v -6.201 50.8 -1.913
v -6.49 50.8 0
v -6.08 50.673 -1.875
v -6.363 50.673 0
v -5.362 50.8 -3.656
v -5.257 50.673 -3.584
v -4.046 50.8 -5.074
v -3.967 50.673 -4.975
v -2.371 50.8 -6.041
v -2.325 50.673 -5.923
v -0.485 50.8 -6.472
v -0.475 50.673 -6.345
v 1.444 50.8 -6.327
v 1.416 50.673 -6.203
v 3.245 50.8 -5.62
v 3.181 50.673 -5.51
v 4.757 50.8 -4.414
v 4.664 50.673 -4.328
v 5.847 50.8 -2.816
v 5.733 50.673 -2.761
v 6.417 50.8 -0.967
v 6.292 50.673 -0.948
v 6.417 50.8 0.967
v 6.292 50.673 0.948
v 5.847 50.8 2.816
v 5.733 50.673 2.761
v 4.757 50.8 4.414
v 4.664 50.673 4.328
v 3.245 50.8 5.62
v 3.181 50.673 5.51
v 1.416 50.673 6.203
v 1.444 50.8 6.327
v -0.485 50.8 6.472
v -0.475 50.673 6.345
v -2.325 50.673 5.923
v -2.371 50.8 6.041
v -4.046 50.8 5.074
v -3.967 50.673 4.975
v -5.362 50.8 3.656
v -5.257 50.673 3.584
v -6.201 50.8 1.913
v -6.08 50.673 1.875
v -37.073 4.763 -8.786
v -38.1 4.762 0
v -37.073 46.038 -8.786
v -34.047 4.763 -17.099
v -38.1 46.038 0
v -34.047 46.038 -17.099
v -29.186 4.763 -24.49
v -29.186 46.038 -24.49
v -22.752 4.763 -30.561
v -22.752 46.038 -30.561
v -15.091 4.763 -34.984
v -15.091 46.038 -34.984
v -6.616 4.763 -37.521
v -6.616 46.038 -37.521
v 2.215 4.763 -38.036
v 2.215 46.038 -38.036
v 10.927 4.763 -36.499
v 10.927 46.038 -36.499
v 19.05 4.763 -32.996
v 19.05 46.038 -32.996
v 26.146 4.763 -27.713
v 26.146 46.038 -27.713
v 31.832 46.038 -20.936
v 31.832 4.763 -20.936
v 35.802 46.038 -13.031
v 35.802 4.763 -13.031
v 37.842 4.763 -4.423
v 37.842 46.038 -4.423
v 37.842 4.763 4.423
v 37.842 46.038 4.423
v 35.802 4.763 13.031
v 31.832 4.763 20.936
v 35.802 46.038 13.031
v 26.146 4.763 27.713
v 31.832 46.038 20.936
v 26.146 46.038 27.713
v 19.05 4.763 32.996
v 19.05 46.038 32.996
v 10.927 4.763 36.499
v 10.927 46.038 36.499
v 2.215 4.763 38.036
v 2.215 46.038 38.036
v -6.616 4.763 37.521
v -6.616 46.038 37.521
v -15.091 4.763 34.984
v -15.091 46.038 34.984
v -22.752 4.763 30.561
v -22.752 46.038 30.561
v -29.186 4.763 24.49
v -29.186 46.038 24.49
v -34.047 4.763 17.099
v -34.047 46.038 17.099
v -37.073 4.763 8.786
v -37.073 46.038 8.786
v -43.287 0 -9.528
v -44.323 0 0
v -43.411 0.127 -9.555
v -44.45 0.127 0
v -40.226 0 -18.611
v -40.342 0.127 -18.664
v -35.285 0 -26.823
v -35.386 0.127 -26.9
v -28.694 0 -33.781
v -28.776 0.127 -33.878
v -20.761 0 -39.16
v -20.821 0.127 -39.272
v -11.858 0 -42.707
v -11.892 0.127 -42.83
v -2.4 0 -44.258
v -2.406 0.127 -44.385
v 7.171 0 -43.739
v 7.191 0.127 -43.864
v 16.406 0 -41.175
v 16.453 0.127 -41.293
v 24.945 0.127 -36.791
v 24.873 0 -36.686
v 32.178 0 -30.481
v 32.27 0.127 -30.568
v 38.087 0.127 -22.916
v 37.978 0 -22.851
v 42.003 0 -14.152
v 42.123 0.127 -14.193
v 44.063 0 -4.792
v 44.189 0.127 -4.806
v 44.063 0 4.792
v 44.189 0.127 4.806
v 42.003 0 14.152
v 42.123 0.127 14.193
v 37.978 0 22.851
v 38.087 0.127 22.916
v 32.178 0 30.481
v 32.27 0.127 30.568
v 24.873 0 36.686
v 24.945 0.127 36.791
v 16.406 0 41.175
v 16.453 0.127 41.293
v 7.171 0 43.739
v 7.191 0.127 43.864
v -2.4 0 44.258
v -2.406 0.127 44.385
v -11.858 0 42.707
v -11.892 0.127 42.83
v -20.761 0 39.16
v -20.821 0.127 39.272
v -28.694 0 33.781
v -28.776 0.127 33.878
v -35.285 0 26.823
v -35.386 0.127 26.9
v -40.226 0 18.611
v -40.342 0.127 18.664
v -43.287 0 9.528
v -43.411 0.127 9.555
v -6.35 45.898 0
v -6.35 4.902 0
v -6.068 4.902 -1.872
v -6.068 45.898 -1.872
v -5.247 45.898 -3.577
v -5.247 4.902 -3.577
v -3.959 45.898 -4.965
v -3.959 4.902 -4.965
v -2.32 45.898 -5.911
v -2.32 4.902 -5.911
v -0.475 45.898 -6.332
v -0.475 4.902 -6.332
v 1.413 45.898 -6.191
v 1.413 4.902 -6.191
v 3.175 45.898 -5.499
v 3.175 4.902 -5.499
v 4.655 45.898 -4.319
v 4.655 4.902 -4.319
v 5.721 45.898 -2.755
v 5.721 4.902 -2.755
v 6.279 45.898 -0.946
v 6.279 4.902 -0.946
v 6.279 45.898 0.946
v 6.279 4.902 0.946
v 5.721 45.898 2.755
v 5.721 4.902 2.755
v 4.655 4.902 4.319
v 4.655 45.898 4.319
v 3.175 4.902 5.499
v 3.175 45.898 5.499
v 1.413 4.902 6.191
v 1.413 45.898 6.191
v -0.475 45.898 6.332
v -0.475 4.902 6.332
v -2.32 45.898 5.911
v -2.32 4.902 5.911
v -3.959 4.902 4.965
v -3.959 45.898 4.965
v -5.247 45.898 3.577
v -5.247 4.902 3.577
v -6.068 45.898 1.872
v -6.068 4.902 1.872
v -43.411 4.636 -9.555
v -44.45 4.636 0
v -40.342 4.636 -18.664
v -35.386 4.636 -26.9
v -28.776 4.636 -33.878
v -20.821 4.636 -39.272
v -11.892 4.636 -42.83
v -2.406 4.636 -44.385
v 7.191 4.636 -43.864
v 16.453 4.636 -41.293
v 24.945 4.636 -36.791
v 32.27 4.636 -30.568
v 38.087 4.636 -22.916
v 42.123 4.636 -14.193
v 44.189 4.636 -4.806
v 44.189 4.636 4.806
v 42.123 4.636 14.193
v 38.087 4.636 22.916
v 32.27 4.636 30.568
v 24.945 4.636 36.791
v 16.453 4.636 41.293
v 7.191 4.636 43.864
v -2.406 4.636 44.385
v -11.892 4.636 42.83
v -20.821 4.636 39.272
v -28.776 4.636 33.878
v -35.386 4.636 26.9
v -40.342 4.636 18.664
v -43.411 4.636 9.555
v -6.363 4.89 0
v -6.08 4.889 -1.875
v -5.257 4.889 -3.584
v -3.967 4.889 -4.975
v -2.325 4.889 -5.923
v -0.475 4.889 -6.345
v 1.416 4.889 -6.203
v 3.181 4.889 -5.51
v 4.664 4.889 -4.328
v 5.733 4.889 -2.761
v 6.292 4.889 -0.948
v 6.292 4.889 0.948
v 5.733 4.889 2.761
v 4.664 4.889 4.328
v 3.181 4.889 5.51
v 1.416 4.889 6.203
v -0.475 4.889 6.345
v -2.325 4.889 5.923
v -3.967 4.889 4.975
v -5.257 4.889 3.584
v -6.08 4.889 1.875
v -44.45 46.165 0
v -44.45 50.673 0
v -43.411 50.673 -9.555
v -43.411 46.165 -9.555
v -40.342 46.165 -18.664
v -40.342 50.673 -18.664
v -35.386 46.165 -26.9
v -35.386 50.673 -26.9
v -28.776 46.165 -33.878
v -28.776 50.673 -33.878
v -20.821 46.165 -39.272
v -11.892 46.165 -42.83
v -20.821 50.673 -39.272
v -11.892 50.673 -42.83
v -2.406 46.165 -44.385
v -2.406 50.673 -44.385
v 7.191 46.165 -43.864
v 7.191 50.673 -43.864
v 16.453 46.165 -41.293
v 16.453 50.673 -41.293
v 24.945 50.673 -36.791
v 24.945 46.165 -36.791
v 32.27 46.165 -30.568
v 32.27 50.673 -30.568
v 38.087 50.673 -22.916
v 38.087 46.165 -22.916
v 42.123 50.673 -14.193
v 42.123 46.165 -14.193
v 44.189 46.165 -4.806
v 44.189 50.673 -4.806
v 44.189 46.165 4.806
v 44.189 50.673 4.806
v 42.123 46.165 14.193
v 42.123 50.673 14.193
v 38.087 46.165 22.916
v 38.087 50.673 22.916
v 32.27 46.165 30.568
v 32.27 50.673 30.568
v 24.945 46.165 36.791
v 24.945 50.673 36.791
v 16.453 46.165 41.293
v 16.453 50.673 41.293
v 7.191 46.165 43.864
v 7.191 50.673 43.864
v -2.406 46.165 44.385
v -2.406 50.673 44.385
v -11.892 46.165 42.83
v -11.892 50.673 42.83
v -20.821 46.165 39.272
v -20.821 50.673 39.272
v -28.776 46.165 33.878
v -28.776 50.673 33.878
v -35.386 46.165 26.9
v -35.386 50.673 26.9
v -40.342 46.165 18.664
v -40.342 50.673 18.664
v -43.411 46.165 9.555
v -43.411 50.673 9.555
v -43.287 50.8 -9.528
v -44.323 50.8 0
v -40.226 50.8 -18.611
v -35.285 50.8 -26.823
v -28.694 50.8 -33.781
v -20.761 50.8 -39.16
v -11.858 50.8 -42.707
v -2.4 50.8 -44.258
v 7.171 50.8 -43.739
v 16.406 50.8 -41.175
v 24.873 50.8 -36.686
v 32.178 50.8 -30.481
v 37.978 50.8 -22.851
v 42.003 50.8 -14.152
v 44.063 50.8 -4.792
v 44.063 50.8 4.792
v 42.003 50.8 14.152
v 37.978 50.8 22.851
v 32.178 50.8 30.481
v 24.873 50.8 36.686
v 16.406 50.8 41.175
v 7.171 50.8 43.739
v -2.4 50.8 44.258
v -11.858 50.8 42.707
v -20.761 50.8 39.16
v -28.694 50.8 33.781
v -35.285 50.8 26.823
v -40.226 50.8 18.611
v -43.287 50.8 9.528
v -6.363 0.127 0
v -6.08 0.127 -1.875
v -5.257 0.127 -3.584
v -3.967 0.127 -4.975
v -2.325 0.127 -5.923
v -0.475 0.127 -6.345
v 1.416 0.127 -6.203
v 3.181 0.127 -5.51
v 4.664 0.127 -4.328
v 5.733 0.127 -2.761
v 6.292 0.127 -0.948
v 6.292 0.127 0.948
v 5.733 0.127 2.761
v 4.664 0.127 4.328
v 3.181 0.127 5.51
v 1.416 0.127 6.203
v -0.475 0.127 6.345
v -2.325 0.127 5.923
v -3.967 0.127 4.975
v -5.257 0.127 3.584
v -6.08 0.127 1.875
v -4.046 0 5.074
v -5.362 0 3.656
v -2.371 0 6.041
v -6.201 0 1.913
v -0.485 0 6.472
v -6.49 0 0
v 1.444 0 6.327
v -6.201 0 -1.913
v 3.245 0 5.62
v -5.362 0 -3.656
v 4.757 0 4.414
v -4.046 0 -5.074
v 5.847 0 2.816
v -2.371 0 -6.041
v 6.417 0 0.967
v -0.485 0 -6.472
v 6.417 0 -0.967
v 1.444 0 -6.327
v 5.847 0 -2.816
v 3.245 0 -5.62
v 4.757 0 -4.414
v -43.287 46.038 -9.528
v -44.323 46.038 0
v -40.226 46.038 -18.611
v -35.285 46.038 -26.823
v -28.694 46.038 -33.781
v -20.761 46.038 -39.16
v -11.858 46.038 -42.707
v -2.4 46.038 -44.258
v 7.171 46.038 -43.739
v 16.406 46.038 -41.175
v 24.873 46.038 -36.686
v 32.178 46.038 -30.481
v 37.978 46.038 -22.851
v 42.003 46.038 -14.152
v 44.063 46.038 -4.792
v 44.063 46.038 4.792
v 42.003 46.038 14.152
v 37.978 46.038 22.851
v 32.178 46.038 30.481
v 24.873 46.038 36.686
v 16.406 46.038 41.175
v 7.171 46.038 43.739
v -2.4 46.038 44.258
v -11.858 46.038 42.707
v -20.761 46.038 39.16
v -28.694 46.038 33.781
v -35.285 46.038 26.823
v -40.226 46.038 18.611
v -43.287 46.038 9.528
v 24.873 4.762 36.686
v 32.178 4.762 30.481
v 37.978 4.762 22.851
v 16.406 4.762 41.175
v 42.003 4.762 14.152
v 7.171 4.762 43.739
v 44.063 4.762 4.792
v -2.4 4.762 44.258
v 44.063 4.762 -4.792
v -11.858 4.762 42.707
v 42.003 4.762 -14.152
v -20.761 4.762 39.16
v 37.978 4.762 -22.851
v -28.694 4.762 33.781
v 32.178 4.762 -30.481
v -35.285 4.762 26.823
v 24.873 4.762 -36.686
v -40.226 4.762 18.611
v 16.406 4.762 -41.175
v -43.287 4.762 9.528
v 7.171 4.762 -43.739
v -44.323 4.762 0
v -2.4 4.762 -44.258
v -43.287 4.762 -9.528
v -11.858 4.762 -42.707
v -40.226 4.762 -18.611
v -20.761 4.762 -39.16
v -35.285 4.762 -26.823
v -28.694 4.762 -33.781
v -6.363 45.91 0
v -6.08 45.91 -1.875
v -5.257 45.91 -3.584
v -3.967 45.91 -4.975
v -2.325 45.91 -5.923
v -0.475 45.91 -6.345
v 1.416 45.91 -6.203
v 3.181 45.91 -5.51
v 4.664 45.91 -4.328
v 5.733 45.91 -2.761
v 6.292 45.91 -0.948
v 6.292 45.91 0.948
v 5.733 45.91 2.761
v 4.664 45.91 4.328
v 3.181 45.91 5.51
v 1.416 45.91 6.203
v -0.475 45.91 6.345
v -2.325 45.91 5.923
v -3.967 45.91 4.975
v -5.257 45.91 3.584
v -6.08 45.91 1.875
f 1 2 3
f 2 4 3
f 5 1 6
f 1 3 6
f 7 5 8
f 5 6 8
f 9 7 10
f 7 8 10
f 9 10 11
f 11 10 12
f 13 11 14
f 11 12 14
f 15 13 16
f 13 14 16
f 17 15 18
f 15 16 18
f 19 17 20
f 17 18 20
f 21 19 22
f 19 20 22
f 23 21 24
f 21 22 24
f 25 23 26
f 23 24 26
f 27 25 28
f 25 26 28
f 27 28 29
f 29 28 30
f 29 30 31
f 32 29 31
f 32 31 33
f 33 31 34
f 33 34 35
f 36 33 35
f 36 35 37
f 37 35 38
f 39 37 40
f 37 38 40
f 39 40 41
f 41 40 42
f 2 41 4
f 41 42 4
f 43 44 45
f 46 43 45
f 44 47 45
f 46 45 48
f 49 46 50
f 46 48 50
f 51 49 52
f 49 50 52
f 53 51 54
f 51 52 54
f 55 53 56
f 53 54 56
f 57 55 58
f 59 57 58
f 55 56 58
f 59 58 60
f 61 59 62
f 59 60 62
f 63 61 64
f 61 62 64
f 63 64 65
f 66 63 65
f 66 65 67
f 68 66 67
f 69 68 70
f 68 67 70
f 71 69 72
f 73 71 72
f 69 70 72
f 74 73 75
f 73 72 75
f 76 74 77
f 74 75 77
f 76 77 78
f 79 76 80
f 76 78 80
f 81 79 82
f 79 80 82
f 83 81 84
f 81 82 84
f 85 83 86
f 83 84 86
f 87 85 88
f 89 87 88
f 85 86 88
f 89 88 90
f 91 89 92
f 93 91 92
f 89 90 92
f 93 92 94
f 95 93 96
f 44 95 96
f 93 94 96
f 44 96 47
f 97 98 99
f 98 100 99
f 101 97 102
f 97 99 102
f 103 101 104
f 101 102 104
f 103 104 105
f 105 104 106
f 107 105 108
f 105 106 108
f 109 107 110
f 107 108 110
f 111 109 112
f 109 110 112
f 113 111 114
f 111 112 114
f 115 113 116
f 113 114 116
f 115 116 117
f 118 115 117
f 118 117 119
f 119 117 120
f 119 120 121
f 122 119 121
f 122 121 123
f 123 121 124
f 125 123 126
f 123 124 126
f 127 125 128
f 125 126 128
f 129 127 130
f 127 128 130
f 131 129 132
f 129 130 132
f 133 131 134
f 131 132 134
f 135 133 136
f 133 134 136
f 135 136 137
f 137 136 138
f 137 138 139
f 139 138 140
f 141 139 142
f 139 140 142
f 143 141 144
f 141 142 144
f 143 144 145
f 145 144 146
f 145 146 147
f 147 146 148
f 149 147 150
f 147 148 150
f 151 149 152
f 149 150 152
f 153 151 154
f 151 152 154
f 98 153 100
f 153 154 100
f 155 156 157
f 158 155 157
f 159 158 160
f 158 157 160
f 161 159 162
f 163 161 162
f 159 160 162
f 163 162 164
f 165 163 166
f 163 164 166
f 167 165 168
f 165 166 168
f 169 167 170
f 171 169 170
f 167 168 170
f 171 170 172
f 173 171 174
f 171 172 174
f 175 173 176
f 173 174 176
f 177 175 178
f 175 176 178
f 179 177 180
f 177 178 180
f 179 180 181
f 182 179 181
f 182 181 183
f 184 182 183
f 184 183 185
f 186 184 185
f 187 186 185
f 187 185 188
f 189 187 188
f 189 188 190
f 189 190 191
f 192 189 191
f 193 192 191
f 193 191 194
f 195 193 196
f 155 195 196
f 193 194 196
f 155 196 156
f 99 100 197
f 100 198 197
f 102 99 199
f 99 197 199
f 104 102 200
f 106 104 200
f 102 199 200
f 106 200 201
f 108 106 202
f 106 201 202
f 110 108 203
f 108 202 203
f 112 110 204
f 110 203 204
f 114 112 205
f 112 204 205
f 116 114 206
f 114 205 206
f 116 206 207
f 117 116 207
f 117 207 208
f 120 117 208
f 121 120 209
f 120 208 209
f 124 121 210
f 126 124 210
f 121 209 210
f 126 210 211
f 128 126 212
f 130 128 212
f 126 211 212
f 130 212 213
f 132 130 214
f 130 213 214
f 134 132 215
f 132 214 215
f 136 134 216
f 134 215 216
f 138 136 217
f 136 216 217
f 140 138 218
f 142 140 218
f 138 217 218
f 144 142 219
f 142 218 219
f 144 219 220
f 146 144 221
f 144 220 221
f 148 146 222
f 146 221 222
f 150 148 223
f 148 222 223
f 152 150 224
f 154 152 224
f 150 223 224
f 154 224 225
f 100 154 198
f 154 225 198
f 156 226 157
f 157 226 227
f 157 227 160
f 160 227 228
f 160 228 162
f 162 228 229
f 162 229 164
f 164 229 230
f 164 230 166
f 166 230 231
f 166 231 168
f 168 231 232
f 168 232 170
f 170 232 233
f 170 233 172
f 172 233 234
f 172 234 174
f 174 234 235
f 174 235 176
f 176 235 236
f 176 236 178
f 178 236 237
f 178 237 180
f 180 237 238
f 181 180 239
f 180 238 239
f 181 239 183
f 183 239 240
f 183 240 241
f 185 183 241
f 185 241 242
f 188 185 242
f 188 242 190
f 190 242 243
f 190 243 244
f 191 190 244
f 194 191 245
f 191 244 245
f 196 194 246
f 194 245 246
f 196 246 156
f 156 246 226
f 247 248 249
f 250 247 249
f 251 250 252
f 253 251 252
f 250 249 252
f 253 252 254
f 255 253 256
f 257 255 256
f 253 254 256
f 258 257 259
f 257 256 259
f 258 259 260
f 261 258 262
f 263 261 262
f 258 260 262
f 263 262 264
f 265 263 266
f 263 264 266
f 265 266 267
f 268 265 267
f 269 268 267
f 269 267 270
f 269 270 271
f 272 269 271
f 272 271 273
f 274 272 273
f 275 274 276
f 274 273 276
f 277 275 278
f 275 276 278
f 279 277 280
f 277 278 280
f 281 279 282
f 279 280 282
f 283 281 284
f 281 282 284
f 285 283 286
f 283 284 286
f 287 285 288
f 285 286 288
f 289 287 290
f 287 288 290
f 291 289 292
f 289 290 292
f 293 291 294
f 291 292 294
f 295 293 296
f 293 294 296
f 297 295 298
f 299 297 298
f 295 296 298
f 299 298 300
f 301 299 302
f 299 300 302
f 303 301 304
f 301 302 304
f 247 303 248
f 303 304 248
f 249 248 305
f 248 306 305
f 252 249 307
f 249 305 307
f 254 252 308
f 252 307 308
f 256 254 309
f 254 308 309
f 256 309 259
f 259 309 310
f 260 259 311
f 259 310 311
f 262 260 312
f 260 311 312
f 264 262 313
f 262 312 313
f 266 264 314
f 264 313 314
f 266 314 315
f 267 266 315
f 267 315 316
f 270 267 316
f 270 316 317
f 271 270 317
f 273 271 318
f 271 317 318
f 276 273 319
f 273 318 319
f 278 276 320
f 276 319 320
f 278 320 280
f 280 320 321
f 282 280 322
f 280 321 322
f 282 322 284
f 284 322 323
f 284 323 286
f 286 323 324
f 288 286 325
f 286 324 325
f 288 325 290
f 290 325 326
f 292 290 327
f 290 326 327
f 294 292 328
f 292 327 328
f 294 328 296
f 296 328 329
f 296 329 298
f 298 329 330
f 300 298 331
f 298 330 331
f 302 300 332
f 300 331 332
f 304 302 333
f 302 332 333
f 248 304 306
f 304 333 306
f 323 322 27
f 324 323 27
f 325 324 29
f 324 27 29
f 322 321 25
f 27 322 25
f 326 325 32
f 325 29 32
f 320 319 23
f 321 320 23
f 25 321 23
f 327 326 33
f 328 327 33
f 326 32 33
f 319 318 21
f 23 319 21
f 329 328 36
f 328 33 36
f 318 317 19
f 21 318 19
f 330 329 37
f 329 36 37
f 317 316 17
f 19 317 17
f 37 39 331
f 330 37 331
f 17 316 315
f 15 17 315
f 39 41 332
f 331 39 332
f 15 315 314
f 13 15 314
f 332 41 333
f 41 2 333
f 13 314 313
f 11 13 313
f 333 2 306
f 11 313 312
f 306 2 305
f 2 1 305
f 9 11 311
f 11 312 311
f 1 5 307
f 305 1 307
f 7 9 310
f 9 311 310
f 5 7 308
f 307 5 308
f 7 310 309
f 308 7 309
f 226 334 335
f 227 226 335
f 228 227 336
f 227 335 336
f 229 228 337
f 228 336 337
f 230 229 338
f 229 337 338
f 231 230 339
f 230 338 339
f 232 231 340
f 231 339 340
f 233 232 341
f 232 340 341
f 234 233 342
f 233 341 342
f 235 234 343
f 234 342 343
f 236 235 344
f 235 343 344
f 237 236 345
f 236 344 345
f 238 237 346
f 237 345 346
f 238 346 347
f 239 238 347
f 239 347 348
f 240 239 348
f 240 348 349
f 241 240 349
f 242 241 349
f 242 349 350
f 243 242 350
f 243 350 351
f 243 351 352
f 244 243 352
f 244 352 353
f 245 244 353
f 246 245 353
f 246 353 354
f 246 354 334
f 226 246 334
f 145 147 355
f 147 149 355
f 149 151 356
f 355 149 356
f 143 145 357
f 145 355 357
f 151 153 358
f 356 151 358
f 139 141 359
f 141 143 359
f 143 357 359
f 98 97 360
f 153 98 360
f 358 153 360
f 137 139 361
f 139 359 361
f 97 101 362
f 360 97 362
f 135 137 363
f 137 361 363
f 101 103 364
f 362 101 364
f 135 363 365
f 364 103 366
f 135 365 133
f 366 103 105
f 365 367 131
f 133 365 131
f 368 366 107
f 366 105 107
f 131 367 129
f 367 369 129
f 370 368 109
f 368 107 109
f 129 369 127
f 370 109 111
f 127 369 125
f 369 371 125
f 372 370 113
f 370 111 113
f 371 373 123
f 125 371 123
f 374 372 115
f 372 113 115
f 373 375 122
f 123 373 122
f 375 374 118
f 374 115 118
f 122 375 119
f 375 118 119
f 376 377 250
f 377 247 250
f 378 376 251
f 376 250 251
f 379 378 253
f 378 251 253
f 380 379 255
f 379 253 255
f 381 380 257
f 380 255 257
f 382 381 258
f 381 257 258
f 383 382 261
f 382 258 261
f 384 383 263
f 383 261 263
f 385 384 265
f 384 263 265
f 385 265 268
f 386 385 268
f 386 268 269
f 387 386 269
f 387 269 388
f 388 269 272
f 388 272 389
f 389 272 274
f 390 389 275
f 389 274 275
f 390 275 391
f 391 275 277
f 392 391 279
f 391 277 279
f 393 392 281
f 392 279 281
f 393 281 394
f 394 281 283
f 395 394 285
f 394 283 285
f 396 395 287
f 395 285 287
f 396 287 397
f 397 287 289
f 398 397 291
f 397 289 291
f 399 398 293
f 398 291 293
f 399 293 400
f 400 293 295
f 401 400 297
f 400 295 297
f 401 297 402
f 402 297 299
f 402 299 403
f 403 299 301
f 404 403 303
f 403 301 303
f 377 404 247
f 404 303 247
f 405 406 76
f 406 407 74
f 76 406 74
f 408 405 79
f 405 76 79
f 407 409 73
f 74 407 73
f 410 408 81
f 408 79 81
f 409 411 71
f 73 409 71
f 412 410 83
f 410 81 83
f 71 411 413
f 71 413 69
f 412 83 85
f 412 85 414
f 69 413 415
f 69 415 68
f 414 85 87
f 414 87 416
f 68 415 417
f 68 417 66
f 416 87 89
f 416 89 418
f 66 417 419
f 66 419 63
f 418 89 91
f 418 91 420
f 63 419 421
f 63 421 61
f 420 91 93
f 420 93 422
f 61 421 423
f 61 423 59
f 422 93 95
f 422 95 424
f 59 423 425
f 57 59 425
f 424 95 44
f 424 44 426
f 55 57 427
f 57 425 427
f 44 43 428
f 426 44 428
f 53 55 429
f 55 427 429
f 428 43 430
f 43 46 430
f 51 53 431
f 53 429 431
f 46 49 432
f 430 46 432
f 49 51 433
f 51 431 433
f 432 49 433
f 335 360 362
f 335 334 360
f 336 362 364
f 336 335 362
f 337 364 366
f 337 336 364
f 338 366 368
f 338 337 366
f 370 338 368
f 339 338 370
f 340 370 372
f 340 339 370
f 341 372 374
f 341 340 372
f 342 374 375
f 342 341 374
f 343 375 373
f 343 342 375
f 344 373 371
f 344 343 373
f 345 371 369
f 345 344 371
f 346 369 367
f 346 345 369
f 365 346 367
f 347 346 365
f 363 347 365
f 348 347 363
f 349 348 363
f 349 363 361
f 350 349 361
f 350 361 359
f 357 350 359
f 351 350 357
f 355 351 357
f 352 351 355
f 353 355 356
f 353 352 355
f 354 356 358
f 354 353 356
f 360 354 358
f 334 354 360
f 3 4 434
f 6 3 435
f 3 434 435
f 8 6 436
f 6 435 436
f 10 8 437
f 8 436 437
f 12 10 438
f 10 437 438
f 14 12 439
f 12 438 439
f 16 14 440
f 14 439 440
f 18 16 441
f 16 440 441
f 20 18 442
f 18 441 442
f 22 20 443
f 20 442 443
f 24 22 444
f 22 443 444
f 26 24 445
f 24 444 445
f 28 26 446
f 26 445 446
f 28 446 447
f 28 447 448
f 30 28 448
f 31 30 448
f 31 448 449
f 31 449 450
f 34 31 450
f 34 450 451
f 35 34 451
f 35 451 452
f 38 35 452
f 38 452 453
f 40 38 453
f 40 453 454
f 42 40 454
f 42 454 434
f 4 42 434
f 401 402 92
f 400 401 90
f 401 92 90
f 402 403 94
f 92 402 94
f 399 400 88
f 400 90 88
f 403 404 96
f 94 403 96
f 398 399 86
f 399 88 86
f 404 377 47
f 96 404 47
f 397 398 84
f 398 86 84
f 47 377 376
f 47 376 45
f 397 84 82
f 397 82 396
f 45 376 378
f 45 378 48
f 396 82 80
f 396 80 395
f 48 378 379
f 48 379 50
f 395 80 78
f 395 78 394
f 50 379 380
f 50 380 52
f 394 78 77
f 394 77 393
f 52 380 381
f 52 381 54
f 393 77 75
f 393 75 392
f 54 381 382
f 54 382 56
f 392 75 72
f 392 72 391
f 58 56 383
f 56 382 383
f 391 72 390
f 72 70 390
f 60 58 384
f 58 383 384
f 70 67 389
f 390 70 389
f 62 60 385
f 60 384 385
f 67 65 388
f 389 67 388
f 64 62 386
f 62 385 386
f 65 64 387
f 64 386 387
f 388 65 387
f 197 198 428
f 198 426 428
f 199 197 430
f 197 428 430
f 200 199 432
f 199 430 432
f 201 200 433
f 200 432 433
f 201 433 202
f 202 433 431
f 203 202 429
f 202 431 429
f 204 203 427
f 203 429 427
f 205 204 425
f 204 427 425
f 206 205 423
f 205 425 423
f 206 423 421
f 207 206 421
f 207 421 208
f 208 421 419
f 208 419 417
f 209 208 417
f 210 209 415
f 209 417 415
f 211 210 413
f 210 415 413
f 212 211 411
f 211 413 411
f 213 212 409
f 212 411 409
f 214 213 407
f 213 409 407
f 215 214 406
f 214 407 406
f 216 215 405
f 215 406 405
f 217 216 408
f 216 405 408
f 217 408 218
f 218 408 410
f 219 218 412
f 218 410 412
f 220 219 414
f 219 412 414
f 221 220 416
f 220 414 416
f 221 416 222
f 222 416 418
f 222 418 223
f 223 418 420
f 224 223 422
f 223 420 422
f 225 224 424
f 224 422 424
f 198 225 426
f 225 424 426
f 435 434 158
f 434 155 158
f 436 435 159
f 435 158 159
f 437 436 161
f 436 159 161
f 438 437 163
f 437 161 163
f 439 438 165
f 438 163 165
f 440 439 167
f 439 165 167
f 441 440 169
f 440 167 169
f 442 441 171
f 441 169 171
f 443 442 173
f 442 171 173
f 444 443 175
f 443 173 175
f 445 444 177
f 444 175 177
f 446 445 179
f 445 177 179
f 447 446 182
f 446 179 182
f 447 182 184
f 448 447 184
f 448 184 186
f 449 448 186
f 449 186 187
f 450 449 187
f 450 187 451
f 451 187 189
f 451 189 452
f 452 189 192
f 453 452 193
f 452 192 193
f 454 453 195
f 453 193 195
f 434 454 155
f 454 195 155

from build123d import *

# Parameters (mm, degrees)
CHAMFER1_SIZE = 0.127


with BuildPart() as part:
    # Sketch1 → Revolve1 (revolve)
    with BuildSketch(Plane.XY, mode=Mode.PRIVATE) as revolve1_sk:
        Polygon((6.3627, 0), (44.45, 0), (44.45, 4.7625), (38.1, 4.7625), (38.1, 46.0375), (44.45, 46.0375), (44.45, 50.8), (6.3627, 50.8), (6.3627, 46.0248), (6.35, 46.0248), (6.35, 4.7752), (6.3627, 4.7752), align=None)
    revolve(revolve1_sk.sketch.rotate(Axis((0, 50.8, 0), (0, -1, 0)), 180), axis=Axis((0, 50.8, 0), (0, -1, 0)))

    # Chamfer1
    # the kernel refuses this chamfer: 0.127 mm, written as the material it takes off along each edge
    with BuildSketch(Plane(origin=(0, 46.0375, 0), x_dir=(-1, 0, 0), z_dir=(0, 0, 1))) as chamfer1_piece_1:
        Polygon((44.45 - CHAMFER1_SIZE, 0), (44.45, -CHAMFER1_SIZE), (44.45, 0), align=None)
    revolve(axis=Axis((0, 46.0375, 0), (0, -1, 0)), mode=Mode.SUBTRACT)
    with BuildSketch(Plane(origin=(0, 4.7625, 0), x_dir=(-1, 0, 0), z_dir=(0, 0, 1))) as chamfer1_piece_2:
        Polygon((44.45, CHAMFER1_SIZE), (44.45 - CHAMFER1_SIZE, 0), (44.45, 0), align=None)
    revolve(axis=Axis((0, 4.7625, 0), (0, -1, 0)), mode=Mode.SUBTRACT)
    with BuildSketch(Plane(origin=(0, 0, 0), x_dir=(-1, 0, 0), z_dir=(0, 0, 1))) as chamfer1_piece_3:
        Polygon((6.3627 + CHAMFER1_SIZE, 0), (6.3627, -CHAMFER1_SIZE), (6.3627, 0), align=None)
    revolve(axis=Axis((0, 0, 0), (0, -1, 0)), mode=Mode.SUBTRACT)
    with BuildSketch(Plane(origin=(0, 0, 0), x_dir=(-1, 0, 0), z_dir=(0, 0, 1))) as chamfer1_piece_4:
        Polygon((44.45 - CHAMFER1_SIZE, 0), (44.45, -CHAMFER1_SIZE), (44.45, 0), align=None)
    revolve(axis=Axis((0, 0, 0), (0, -1, 0)), mode=Mode.SUBTRACT)
    with BuildSketch(Plane(origin=(0, 46.0248, 0), x_dir=(-1, 0, 0), z_dir=(0, 0, 1))) as chamfer1_piece_5_section:
        Polygon((6.35 + CHAMFER1_SIZE, 0), (6.35, CHAMFER1_SIZE), (6.35, 0), align=None)
    chamfer1_piece_5 = revolve(axis=Axis((0, 46.0248, 0), (0, -1, 0)), mode=Mode.PRIVATE)
    chamfer1_piece_5 = chamfer1_piece_5 & Plane(origin=(0, 45.905383225, 0), x_dir=(-1, 0, 0), z_dir=(0, -1, 0)) * Cylinder(6.3627, 26, mode=Mode.PRIVATE)
    add(chamfer1_piece_5, mode=Mode.SUBTRACT)
    with BuildSketch(Plane(origin=(0, 4.7752, 0), x_dir=(-1, 0, 0), z_dir=(0, 0, 1))) as chamfer1_piece_6_section:
        Polygon((6.35, -CHAMFER1_SIZE), (6.35 + CHAMFER1_SIZE, 0), (6.35, 0), align=None)
    chamfer1_piece_6 = revolve(axis=Axis((0, 4.7752, 0), (0, -1, 0)), mode=Mode.PRIVATE)
    chamfer1_piece_6 = chamfer1_piece_6 & Plane(origin=(0, 4.894616775, 0), x_dir=(-1, 0, 0), z_dir=(0, -1, 0)) * Cylinder(6.3627, 26, mode=Mode.PRIVATE)
    add(chamfer1_piece_6, mode=Mode.SUBTRACT)
    with BuildSketch(Plane(origin=(0, 50.8, 0), x_dir=(-1, 0, 0), z_dir=(0, 0, 1))) as chamfer1_piece_7:
        Polygon((44.45, CHAMFER1_SIZE), (44.45 - CHAMFER1_SIZE, 0), (44.45, 0), align=None)
    revolve(axis=Axis((0, 50.8, 0), (0, -1, 0)), mode=Mode.SUBTRACT)
    with BuildSketch(Plane(origin=(0, 50.8, 0), x_dir=(-1, 0, 0), z_dir=(0, 0, 1))) as chamfer1_piece_8:
        Polygon((6.3627 + CHAMFER1_SIZE, 0), (6.3627, CHAMFER1_SIZE), (6.3627, 0), align=None)
    revolve(axis=Axis((0, 50.8, 0), (0, -1, 0)), mode=Mode.SUBTRACT)


solid = part.part
